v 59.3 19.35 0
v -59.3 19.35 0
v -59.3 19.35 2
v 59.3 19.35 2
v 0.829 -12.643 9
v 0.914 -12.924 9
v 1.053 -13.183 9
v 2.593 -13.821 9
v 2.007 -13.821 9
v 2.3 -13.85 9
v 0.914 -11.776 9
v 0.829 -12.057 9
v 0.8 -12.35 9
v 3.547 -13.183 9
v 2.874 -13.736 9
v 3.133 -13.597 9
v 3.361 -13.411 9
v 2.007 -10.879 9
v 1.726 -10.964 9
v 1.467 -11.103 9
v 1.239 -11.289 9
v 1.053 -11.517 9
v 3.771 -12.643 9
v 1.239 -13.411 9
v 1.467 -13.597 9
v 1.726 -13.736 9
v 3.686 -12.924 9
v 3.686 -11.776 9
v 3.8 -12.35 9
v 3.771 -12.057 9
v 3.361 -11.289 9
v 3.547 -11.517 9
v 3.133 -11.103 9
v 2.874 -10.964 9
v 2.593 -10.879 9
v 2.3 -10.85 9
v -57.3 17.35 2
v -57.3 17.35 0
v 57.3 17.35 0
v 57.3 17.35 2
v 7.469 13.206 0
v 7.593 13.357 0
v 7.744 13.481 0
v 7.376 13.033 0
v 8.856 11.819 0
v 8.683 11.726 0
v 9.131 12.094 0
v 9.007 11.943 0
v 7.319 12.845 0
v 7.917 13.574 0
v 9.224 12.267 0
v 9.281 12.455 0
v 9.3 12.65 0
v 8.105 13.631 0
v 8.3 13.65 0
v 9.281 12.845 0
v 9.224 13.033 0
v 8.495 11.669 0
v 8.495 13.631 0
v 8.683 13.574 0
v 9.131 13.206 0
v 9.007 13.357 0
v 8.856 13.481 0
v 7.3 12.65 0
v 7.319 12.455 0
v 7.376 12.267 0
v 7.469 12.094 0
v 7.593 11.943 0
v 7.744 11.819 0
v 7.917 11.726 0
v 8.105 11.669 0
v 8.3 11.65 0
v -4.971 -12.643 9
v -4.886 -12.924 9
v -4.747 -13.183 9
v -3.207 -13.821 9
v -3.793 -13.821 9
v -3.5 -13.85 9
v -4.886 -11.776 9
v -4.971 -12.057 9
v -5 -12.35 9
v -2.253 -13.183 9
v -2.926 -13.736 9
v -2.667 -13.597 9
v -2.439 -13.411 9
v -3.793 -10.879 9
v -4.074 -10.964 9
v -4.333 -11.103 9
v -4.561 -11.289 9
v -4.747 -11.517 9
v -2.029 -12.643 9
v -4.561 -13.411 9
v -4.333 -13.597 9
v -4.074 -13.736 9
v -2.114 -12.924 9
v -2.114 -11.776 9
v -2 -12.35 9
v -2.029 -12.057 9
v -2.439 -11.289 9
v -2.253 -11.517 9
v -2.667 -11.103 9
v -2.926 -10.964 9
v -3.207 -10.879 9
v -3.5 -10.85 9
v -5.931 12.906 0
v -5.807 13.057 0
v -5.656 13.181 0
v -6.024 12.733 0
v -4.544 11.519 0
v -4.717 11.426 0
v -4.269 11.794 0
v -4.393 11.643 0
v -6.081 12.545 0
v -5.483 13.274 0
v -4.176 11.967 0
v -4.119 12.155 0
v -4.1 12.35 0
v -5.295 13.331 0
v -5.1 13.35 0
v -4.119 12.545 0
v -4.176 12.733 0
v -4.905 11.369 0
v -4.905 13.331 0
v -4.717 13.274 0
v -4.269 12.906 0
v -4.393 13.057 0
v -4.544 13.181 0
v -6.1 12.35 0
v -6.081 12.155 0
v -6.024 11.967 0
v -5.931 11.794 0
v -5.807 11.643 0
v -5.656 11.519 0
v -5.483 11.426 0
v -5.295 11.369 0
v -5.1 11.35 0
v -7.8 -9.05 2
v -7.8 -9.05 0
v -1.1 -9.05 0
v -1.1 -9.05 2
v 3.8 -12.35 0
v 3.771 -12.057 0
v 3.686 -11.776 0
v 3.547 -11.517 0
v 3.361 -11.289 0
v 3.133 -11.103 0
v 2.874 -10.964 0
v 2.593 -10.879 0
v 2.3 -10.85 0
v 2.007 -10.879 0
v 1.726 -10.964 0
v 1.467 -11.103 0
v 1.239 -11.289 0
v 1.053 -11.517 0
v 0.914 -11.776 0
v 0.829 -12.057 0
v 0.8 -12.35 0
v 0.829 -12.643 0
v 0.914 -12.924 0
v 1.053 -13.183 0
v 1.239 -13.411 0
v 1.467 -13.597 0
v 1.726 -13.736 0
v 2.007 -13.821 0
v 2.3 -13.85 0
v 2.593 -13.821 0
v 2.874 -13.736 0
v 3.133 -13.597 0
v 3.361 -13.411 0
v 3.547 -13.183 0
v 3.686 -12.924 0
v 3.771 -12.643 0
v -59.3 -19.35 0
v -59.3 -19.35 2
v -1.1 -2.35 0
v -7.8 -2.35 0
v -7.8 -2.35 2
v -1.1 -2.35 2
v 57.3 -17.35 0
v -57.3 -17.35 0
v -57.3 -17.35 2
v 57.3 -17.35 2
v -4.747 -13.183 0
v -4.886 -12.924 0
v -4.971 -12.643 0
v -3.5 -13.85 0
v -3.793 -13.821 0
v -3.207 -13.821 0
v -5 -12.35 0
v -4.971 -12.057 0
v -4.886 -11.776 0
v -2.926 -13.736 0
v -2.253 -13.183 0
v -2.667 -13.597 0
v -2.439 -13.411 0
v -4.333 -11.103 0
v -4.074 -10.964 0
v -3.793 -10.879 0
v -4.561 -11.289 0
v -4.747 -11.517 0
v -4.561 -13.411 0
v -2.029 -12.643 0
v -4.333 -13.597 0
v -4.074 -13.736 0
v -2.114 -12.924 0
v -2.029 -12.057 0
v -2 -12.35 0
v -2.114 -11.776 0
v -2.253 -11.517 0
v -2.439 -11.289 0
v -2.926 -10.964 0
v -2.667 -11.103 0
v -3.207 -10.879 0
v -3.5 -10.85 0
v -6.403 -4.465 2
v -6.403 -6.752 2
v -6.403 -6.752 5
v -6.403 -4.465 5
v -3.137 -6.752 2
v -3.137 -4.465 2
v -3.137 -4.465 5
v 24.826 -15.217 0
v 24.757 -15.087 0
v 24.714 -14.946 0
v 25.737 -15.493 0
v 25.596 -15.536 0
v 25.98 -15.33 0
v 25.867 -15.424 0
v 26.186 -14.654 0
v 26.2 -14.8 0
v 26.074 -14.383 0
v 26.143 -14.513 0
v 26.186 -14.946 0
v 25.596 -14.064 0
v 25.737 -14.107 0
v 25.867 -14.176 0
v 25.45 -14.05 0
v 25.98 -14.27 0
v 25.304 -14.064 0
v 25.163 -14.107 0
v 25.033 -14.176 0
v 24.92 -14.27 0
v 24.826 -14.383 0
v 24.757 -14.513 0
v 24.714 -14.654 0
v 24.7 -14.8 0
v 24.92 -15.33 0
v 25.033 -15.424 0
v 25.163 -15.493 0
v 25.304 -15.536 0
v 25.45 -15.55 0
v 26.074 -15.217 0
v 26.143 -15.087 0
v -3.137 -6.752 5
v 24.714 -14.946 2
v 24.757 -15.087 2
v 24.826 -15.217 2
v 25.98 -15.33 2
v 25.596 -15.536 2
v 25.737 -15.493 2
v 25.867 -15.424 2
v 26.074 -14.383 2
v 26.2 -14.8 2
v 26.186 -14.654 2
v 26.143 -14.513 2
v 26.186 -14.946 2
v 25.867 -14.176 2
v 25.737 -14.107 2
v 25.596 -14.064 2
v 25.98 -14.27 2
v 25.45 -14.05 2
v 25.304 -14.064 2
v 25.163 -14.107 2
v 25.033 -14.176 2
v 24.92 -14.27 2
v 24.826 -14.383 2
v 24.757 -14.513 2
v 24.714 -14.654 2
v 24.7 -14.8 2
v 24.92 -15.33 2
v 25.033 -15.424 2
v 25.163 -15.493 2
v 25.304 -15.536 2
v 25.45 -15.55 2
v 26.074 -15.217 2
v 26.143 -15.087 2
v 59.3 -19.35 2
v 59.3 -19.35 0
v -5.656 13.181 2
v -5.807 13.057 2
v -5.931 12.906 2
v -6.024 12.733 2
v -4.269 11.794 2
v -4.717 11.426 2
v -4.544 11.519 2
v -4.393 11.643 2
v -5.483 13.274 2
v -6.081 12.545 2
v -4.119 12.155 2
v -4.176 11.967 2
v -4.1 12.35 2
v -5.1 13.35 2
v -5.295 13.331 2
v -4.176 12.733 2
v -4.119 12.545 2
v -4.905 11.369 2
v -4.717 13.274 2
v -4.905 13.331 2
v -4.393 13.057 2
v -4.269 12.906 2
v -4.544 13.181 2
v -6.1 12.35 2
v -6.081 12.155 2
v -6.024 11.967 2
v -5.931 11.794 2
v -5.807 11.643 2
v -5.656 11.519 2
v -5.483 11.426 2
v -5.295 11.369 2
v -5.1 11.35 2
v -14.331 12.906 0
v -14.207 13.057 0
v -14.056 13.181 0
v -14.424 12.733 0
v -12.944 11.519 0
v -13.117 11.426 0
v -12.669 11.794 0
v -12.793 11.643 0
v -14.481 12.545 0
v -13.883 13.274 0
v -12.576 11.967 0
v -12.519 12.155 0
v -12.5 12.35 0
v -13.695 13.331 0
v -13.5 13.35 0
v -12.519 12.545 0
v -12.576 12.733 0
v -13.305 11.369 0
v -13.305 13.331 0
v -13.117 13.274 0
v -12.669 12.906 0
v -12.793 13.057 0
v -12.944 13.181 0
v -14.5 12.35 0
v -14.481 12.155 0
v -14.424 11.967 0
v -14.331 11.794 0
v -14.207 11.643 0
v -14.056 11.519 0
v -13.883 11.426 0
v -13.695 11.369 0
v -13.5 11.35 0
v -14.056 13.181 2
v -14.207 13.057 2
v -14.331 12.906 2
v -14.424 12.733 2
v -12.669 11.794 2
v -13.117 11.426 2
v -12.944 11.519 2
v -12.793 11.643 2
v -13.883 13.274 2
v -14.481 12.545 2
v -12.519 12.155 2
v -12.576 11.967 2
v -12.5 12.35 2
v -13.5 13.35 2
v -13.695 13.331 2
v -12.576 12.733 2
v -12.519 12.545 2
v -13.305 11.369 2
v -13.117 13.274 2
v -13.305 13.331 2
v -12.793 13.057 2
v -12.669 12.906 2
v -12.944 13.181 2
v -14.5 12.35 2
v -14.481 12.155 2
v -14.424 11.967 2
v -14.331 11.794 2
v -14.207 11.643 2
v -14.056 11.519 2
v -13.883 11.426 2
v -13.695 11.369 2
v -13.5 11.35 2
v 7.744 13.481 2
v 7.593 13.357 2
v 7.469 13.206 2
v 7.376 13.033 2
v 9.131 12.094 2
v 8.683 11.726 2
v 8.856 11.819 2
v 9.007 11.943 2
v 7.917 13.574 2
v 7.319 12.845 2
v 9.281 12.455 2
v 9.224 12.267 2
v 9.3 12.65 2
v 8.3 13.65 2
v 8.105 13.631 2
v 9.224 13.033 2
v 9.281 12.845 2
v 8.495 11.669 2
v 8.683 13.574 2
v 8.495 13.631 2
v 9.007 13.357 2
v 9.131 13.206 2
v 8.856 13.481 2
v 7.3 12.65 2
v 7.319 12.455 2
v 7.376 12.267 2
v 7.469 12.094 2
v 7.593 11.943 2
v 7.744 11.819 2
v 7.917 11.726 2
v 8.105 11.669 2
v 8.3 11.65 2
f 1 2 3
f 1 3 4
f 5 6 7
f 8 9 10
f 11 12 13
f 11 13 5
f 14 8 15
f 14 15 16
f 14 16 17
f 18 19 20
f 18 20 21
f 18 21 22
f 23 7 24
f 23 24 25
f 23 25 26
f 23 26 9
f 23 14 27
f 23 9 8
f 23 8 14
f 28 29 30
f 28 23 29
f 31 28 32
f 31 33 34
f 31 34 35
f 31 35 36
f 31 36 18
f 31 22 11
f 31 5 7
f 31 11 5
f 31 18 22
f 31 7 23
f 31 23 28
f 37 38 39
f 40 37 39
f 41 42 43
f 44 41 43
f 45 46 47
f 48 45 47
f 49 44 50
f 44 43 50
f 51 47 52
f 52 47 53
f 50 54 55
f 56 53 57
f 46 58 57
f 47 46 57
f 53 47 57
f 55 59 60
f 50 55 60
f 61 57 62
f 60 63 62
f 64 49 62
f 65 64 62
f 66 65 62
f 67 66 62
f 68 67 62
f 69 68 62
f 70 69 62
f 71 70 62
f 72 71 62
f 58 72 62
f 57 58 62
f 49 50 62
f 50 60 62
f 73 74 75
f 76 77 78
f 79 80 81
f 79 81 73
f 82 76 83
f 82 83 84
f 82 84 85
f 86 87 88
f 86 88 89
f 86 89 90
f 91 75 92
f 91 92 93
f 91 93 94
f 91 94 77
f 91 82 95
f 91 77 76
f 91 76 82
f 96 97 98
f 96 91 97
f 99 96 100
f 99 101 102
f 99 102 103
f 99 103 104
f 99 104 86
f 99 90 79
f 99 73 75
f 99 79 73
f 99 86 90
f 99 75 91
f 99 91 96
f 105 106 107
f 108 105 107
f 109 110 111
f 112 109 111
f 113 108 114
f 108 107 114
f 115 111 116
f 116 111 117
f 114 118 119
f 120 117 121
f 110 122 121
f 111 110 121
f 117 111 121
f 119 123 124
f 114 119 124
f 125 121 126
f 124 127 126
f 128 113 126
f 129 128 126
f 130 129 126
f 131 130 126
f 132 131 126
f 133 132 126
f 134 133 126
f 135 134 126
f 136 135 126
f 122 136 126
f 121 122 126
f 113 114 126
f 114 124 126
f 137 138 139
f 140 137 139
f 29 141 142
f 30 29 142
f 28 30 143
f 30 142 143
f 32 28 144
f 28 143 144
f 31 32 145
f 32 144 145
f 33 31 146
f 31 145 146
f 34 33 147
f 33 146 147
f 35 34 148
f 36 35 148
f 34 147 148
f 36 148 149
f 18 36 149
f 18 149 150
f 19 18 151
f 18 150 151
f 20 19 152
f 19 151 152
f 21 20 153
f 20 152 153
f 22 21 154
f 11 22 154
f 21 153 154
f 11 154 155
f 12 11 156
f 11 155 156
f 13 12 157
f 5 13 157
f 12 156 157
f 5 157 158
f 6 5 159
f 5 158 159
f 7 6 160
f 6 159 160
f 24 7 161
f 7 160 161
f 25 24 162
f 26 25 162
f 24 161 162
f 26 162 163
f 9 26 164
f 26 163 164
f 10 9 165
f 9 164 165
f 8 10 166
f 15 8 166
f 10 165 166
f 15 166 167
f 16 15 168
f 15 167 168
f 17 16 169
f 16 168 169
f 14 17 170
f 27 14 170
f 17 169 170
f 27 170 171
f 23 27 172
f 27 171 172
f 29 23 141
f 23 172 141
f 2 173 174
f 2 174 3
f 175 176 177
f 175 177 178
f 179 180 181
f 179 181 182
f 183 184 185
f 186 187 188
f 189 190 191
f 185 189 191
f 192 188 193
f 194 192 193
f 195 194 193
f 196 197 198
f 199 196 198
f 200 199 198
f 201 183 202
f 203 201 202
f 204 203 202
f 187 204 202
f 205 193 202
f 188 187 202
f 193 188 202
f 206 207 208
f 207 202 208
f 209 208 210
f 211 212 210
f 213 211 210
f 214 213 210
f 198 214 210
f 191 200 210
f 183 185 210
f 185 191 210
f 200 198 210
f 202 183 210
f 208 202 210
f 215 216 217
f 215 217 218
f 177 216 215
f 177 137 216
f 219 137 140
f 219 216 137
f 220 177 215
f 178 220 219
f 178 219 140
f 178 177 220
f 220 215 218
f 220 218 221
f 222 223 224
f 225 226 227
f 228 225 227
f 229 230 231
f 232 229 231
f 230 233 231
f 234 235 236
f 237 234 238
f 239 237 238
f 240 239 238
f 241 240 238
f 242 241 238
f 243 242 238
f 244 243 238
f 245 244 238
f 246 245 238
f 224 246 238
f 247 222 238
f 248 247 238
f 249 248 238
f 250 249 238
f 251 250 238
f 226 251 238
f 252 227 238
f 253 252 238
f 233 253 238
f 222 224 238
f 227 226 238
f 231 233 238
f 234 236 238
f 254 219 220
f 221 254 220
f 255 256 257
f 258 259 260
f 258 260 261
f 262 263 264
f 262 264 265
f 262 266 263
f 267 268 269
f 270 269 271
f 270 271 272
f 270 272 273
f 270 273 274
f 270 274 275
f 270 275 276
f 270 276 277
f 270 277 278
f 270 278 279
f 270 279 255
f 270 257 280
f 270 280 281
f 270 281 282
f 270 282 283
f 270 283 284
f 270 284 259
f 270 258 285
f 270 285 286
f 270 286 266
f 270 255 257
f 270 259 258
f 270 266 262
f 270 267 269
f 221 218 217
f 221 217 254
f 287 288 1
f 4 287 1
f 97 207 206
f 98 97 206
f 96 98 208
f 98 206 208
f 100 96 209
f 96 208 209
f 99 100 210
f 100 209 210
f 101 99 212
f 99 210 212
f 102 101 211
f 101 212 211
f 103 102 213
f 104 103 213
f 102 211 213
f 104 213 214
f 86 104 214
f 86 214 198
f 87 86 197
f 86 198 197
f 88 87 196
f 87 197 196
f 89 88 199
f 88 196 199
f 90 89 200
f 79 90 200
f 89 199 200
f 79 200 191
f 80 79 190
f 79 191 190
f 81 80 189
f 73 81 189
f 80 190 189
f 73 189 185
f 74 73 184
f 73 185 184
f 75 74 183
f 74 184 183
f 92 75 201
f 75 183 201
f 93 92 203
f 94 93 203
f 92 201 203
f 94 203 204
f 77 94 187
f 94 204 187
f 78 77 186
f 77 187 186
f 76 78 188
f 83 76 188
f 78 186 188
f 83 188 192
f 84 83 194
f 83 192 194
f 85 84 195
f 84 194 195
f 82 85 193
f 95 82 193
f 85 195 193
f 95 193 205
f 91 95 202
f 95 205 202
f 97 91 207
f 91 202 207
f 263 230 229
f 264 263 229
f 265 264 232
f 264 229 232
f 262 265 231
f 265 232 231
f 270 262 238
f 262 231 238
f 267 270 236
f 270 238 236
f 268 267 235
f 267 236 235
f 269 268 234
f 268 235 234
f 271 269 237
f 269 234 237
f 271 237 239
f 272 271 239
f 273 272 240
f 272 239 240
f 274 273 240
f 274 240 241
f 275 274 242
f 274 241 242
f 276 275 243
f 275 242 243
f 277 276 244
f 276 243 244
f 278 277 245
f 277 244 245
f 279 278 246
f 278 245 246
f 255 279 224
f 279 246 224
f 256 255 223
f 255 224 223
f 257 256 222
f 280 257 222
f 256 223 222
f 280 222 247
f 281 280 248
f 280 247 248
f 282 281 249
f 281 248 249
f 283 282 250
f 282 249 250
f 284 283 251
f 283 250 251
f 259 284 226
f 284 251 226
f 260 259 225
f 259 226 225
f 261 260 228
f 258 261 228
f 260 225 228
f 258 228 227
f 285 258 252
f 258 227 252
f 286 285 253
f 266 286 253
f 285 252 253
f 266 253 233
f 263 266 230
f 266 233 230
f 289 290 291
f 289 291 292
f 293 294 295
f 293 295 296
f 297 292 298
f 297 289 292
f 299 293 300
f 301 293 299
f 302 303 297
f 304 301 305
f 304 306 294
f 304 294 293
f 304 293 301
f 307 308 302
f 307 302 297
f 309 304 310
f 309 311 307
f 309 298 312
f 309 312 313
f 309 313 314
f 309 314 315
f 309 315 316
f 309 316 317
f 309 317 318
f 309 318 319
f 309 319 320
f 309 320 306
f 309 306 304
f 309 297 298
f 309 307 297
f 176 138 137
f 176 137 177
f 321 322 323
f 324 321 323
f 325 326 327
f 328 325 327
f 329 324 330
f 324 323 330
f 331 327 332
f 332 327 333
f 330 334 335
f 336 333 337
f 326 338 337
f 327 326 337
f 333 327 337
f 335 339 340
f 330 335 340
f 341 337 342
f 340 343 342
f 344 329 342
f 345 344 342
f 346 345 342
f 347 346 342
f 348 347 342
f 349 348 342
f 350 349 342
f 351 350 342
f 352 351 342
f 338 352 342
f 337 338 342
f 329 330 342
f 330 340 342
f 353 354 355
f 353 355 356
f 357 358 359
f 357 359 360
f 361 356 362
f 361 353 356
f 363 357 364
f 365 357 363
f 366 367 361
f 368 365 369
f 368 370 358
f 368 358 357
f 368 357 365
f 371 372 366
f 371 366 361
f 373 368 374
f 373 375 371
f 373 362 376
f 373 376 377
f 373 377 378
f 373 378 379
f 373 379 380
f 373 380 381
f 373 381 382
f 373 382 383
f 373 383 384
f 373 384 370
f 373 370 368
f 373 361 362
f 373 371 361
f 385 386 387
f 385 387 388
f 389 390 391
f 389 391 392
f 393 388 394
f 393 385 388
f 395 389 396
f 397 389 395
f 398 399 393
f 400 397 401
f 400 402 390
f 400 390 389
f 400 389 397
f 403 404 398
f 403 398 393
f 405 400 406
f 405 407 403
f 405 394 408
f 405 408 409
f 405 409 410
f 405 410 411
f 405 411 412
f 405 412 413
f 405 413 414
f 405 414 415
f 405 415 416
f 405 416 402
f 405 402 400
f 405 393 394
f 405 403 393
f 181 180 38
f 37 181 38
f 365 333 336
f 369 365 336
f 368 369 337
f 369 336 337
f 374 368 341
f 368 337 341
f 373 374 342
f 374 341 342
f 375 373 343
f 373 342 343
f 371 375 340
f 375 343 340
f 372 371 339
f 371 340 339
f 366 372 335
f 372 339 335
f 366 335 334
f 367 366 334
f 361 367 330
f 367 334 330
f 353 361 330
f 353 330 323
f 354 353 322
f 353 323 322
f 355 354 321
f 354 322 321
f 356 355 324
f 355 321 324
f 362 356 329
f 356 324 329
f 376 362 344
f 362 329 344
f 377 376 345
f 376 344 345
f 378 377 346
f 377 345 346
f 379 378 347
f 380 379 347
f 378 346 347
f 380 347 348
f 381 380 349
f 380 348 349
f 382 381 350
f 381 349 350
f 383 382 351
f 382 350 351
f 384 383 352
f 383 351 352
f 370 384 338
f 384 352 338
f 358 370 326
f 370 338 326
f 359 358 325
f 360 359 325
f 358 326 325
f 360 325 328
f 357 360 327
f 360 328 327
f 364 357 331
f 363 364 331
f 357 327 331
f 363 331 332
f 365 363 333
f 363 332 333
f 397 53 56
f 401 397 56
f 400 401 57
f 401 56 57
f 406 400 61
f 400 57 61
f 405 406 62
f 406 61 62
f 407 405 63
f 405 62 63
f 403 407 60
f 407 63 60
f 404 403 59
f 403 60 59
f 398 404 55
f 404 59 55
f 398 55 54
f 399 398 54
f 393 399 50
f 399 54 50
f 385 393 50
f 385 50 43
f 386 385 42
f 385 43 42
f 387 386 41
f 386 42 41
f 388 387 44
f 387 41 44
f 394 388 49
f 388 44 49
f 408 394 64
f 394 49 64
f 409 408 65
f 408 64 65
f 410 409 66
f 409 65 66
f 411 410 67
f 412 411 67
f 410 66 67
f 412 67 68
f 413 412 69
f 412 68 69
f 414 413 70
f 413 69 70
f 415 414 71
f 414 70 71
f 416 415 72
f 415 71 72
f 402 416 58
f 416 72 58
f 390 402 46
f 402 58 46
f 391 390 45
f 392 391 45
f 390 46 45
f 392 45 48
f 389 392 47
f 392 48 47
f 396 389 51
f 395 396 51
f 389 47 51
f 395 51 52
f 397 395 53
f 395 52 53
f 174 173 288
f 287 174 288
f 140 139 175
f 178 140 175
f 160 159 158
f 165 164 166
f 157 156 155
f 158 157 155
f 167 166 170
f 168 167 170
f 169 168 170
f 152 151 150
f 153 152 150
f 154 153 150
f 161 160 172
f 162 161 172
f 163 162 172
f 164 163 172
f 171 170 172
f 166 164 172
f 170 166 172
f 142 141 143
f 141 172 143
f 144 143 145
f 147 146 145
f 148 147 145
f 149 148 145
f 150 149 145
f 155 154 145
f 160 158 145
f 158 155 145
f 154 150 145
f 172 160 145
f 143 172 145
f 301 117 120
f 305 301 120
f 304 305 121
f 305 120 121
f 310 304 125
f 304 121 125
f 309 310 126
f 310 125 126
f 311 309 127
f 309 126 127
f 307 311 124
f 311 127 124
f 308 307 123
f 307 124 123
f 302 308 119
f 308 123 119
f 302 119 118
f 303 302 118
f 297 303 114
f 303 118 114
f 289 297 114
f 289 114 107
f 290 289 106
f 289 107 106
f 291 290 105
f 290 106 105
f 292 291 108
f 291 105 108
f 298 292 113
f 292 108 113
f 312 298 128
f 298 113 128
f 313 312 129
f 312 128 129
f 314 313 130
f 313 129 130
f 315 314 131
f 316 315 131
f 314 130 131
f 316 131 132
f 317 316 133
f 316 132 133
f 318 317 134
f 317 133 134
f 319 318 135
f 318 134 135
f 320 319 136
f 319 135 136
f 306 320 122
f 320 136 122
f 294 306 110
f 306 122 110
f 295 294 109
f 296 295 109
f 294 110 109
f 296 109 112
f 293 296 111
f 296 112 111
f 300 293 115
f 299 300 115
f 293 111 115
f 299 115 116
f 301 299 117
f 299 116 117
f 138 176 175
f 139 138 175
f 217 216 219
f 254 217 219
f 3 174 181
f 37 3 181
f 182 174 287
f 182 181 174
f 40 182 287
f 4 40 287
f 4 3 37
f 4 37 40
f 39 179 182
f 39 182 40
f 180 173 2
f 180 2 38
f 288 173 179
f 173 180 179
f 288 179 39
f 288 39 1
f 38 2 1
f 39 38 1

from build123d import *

# Parameters (mm, degrees)
F0_W     = 118.6
F0_H     = 38.7
F0_W_2   = 114.6
F0_H_2   = 34.7
F1_DEPTH = 2
F0_W_3   = 6.7
F0_H_3   = 6.7
F0_W_4   = 3.2661254518
F0_H_4   = 2.2862879559
F0_R     = 1
F0_R_2   = 0.75
F0_R_3   = 1.5
F2_DEPTH = 9
F3_DEPTH = 5


with BuildPart() as f1:
    # F0 (on Top) → F1 (new body)
    with BuildSketch(Plane.XY):
        Rectangle(F0_W, F0_H)
        Rectangle(F0_W_2, F0_H_2, mode=Mode.SUBTRACT)
    extrude(amount=F1_DEPTH)


with BuildPart() as f1b:
    # F0 (on Top) → F1, piece 2 (new body)
    with BuildSketch(Plane.XY):
        with Locations((-4.45, -5.7)):
            Rectangle(F0_W_3, F0_H_3)
        with Locations((-4.7700782306, -5.6086238474)):
            Rectangle(F0_W_4, F0_H_4, mode=Mode.SUBTRACT)
    extrude(amount=F1_DEPTH)

    # F0 (on Top) → F3 (join)
    with BuildSketch(Plane.XY):
        with Locations((-4.7700782306, -5.6086238474)):
            Rectangle(F0_W_4, F0_H_4)
    extrude(amount=F3_DEPTH)


with BuildPart() as f1c:
    # F0 (on Top) → F1, piece 3 (new body)
    with BuildSketch(Plane.XY):
        with Locations((-13.5, 12.35)):
            Circle(F0_R)
    extrude(amount=F1_DEPTH)


with BuildPart() as f1d:
    # F0 (on Top) → F1, piece 4 (new body)
    with BuildSketch(Plane.XY):
        with Locations((-5.1, 12.35)):
            Circle(F0_R)
    extrude(amount=F1_DEPTH)


with BuildPart() as f1e:
    # F0 (on Top) → F1, piece 5 (new body)
    with BuildSketch(Plane.XY):
        with Locations((8.3, 12.65)):
            Circle(F0_R)
    extrude(amount=F1_DEPTH)


with BuildPart() as f1f:
    # F0 (on Top) → F1, piece 6 (new body)
    with BuildSketch(Plane.XY):
        with Locations((25.45, -14.8)):
            Circle(F0_R_2)
    extrude(amount=F1_DEPTH)


with BuildPart() as f2:
    # F0 (on Top) → F2 (new body)
    with BuildSketch(Plane.XY):
        with Locations((-3.5, -12.35)):
            Circle(F0_R_3)
    extrude(amount=F2_DEPTH)


with BuildPart() as f2b:
    # F0 (on Top) → F2, piece 2 (new body)
    with BuildSketch(Plane.XY):
        with Locations((2.3, -12.35)):
            Circle(F0_R_3)
    extrude(amount=F2_DEPTH)


solid = Compound([f1.part, f1b.part, f1c.part, f1d.part, f1e.part, f1f.part, f2.part, f2b.part])
